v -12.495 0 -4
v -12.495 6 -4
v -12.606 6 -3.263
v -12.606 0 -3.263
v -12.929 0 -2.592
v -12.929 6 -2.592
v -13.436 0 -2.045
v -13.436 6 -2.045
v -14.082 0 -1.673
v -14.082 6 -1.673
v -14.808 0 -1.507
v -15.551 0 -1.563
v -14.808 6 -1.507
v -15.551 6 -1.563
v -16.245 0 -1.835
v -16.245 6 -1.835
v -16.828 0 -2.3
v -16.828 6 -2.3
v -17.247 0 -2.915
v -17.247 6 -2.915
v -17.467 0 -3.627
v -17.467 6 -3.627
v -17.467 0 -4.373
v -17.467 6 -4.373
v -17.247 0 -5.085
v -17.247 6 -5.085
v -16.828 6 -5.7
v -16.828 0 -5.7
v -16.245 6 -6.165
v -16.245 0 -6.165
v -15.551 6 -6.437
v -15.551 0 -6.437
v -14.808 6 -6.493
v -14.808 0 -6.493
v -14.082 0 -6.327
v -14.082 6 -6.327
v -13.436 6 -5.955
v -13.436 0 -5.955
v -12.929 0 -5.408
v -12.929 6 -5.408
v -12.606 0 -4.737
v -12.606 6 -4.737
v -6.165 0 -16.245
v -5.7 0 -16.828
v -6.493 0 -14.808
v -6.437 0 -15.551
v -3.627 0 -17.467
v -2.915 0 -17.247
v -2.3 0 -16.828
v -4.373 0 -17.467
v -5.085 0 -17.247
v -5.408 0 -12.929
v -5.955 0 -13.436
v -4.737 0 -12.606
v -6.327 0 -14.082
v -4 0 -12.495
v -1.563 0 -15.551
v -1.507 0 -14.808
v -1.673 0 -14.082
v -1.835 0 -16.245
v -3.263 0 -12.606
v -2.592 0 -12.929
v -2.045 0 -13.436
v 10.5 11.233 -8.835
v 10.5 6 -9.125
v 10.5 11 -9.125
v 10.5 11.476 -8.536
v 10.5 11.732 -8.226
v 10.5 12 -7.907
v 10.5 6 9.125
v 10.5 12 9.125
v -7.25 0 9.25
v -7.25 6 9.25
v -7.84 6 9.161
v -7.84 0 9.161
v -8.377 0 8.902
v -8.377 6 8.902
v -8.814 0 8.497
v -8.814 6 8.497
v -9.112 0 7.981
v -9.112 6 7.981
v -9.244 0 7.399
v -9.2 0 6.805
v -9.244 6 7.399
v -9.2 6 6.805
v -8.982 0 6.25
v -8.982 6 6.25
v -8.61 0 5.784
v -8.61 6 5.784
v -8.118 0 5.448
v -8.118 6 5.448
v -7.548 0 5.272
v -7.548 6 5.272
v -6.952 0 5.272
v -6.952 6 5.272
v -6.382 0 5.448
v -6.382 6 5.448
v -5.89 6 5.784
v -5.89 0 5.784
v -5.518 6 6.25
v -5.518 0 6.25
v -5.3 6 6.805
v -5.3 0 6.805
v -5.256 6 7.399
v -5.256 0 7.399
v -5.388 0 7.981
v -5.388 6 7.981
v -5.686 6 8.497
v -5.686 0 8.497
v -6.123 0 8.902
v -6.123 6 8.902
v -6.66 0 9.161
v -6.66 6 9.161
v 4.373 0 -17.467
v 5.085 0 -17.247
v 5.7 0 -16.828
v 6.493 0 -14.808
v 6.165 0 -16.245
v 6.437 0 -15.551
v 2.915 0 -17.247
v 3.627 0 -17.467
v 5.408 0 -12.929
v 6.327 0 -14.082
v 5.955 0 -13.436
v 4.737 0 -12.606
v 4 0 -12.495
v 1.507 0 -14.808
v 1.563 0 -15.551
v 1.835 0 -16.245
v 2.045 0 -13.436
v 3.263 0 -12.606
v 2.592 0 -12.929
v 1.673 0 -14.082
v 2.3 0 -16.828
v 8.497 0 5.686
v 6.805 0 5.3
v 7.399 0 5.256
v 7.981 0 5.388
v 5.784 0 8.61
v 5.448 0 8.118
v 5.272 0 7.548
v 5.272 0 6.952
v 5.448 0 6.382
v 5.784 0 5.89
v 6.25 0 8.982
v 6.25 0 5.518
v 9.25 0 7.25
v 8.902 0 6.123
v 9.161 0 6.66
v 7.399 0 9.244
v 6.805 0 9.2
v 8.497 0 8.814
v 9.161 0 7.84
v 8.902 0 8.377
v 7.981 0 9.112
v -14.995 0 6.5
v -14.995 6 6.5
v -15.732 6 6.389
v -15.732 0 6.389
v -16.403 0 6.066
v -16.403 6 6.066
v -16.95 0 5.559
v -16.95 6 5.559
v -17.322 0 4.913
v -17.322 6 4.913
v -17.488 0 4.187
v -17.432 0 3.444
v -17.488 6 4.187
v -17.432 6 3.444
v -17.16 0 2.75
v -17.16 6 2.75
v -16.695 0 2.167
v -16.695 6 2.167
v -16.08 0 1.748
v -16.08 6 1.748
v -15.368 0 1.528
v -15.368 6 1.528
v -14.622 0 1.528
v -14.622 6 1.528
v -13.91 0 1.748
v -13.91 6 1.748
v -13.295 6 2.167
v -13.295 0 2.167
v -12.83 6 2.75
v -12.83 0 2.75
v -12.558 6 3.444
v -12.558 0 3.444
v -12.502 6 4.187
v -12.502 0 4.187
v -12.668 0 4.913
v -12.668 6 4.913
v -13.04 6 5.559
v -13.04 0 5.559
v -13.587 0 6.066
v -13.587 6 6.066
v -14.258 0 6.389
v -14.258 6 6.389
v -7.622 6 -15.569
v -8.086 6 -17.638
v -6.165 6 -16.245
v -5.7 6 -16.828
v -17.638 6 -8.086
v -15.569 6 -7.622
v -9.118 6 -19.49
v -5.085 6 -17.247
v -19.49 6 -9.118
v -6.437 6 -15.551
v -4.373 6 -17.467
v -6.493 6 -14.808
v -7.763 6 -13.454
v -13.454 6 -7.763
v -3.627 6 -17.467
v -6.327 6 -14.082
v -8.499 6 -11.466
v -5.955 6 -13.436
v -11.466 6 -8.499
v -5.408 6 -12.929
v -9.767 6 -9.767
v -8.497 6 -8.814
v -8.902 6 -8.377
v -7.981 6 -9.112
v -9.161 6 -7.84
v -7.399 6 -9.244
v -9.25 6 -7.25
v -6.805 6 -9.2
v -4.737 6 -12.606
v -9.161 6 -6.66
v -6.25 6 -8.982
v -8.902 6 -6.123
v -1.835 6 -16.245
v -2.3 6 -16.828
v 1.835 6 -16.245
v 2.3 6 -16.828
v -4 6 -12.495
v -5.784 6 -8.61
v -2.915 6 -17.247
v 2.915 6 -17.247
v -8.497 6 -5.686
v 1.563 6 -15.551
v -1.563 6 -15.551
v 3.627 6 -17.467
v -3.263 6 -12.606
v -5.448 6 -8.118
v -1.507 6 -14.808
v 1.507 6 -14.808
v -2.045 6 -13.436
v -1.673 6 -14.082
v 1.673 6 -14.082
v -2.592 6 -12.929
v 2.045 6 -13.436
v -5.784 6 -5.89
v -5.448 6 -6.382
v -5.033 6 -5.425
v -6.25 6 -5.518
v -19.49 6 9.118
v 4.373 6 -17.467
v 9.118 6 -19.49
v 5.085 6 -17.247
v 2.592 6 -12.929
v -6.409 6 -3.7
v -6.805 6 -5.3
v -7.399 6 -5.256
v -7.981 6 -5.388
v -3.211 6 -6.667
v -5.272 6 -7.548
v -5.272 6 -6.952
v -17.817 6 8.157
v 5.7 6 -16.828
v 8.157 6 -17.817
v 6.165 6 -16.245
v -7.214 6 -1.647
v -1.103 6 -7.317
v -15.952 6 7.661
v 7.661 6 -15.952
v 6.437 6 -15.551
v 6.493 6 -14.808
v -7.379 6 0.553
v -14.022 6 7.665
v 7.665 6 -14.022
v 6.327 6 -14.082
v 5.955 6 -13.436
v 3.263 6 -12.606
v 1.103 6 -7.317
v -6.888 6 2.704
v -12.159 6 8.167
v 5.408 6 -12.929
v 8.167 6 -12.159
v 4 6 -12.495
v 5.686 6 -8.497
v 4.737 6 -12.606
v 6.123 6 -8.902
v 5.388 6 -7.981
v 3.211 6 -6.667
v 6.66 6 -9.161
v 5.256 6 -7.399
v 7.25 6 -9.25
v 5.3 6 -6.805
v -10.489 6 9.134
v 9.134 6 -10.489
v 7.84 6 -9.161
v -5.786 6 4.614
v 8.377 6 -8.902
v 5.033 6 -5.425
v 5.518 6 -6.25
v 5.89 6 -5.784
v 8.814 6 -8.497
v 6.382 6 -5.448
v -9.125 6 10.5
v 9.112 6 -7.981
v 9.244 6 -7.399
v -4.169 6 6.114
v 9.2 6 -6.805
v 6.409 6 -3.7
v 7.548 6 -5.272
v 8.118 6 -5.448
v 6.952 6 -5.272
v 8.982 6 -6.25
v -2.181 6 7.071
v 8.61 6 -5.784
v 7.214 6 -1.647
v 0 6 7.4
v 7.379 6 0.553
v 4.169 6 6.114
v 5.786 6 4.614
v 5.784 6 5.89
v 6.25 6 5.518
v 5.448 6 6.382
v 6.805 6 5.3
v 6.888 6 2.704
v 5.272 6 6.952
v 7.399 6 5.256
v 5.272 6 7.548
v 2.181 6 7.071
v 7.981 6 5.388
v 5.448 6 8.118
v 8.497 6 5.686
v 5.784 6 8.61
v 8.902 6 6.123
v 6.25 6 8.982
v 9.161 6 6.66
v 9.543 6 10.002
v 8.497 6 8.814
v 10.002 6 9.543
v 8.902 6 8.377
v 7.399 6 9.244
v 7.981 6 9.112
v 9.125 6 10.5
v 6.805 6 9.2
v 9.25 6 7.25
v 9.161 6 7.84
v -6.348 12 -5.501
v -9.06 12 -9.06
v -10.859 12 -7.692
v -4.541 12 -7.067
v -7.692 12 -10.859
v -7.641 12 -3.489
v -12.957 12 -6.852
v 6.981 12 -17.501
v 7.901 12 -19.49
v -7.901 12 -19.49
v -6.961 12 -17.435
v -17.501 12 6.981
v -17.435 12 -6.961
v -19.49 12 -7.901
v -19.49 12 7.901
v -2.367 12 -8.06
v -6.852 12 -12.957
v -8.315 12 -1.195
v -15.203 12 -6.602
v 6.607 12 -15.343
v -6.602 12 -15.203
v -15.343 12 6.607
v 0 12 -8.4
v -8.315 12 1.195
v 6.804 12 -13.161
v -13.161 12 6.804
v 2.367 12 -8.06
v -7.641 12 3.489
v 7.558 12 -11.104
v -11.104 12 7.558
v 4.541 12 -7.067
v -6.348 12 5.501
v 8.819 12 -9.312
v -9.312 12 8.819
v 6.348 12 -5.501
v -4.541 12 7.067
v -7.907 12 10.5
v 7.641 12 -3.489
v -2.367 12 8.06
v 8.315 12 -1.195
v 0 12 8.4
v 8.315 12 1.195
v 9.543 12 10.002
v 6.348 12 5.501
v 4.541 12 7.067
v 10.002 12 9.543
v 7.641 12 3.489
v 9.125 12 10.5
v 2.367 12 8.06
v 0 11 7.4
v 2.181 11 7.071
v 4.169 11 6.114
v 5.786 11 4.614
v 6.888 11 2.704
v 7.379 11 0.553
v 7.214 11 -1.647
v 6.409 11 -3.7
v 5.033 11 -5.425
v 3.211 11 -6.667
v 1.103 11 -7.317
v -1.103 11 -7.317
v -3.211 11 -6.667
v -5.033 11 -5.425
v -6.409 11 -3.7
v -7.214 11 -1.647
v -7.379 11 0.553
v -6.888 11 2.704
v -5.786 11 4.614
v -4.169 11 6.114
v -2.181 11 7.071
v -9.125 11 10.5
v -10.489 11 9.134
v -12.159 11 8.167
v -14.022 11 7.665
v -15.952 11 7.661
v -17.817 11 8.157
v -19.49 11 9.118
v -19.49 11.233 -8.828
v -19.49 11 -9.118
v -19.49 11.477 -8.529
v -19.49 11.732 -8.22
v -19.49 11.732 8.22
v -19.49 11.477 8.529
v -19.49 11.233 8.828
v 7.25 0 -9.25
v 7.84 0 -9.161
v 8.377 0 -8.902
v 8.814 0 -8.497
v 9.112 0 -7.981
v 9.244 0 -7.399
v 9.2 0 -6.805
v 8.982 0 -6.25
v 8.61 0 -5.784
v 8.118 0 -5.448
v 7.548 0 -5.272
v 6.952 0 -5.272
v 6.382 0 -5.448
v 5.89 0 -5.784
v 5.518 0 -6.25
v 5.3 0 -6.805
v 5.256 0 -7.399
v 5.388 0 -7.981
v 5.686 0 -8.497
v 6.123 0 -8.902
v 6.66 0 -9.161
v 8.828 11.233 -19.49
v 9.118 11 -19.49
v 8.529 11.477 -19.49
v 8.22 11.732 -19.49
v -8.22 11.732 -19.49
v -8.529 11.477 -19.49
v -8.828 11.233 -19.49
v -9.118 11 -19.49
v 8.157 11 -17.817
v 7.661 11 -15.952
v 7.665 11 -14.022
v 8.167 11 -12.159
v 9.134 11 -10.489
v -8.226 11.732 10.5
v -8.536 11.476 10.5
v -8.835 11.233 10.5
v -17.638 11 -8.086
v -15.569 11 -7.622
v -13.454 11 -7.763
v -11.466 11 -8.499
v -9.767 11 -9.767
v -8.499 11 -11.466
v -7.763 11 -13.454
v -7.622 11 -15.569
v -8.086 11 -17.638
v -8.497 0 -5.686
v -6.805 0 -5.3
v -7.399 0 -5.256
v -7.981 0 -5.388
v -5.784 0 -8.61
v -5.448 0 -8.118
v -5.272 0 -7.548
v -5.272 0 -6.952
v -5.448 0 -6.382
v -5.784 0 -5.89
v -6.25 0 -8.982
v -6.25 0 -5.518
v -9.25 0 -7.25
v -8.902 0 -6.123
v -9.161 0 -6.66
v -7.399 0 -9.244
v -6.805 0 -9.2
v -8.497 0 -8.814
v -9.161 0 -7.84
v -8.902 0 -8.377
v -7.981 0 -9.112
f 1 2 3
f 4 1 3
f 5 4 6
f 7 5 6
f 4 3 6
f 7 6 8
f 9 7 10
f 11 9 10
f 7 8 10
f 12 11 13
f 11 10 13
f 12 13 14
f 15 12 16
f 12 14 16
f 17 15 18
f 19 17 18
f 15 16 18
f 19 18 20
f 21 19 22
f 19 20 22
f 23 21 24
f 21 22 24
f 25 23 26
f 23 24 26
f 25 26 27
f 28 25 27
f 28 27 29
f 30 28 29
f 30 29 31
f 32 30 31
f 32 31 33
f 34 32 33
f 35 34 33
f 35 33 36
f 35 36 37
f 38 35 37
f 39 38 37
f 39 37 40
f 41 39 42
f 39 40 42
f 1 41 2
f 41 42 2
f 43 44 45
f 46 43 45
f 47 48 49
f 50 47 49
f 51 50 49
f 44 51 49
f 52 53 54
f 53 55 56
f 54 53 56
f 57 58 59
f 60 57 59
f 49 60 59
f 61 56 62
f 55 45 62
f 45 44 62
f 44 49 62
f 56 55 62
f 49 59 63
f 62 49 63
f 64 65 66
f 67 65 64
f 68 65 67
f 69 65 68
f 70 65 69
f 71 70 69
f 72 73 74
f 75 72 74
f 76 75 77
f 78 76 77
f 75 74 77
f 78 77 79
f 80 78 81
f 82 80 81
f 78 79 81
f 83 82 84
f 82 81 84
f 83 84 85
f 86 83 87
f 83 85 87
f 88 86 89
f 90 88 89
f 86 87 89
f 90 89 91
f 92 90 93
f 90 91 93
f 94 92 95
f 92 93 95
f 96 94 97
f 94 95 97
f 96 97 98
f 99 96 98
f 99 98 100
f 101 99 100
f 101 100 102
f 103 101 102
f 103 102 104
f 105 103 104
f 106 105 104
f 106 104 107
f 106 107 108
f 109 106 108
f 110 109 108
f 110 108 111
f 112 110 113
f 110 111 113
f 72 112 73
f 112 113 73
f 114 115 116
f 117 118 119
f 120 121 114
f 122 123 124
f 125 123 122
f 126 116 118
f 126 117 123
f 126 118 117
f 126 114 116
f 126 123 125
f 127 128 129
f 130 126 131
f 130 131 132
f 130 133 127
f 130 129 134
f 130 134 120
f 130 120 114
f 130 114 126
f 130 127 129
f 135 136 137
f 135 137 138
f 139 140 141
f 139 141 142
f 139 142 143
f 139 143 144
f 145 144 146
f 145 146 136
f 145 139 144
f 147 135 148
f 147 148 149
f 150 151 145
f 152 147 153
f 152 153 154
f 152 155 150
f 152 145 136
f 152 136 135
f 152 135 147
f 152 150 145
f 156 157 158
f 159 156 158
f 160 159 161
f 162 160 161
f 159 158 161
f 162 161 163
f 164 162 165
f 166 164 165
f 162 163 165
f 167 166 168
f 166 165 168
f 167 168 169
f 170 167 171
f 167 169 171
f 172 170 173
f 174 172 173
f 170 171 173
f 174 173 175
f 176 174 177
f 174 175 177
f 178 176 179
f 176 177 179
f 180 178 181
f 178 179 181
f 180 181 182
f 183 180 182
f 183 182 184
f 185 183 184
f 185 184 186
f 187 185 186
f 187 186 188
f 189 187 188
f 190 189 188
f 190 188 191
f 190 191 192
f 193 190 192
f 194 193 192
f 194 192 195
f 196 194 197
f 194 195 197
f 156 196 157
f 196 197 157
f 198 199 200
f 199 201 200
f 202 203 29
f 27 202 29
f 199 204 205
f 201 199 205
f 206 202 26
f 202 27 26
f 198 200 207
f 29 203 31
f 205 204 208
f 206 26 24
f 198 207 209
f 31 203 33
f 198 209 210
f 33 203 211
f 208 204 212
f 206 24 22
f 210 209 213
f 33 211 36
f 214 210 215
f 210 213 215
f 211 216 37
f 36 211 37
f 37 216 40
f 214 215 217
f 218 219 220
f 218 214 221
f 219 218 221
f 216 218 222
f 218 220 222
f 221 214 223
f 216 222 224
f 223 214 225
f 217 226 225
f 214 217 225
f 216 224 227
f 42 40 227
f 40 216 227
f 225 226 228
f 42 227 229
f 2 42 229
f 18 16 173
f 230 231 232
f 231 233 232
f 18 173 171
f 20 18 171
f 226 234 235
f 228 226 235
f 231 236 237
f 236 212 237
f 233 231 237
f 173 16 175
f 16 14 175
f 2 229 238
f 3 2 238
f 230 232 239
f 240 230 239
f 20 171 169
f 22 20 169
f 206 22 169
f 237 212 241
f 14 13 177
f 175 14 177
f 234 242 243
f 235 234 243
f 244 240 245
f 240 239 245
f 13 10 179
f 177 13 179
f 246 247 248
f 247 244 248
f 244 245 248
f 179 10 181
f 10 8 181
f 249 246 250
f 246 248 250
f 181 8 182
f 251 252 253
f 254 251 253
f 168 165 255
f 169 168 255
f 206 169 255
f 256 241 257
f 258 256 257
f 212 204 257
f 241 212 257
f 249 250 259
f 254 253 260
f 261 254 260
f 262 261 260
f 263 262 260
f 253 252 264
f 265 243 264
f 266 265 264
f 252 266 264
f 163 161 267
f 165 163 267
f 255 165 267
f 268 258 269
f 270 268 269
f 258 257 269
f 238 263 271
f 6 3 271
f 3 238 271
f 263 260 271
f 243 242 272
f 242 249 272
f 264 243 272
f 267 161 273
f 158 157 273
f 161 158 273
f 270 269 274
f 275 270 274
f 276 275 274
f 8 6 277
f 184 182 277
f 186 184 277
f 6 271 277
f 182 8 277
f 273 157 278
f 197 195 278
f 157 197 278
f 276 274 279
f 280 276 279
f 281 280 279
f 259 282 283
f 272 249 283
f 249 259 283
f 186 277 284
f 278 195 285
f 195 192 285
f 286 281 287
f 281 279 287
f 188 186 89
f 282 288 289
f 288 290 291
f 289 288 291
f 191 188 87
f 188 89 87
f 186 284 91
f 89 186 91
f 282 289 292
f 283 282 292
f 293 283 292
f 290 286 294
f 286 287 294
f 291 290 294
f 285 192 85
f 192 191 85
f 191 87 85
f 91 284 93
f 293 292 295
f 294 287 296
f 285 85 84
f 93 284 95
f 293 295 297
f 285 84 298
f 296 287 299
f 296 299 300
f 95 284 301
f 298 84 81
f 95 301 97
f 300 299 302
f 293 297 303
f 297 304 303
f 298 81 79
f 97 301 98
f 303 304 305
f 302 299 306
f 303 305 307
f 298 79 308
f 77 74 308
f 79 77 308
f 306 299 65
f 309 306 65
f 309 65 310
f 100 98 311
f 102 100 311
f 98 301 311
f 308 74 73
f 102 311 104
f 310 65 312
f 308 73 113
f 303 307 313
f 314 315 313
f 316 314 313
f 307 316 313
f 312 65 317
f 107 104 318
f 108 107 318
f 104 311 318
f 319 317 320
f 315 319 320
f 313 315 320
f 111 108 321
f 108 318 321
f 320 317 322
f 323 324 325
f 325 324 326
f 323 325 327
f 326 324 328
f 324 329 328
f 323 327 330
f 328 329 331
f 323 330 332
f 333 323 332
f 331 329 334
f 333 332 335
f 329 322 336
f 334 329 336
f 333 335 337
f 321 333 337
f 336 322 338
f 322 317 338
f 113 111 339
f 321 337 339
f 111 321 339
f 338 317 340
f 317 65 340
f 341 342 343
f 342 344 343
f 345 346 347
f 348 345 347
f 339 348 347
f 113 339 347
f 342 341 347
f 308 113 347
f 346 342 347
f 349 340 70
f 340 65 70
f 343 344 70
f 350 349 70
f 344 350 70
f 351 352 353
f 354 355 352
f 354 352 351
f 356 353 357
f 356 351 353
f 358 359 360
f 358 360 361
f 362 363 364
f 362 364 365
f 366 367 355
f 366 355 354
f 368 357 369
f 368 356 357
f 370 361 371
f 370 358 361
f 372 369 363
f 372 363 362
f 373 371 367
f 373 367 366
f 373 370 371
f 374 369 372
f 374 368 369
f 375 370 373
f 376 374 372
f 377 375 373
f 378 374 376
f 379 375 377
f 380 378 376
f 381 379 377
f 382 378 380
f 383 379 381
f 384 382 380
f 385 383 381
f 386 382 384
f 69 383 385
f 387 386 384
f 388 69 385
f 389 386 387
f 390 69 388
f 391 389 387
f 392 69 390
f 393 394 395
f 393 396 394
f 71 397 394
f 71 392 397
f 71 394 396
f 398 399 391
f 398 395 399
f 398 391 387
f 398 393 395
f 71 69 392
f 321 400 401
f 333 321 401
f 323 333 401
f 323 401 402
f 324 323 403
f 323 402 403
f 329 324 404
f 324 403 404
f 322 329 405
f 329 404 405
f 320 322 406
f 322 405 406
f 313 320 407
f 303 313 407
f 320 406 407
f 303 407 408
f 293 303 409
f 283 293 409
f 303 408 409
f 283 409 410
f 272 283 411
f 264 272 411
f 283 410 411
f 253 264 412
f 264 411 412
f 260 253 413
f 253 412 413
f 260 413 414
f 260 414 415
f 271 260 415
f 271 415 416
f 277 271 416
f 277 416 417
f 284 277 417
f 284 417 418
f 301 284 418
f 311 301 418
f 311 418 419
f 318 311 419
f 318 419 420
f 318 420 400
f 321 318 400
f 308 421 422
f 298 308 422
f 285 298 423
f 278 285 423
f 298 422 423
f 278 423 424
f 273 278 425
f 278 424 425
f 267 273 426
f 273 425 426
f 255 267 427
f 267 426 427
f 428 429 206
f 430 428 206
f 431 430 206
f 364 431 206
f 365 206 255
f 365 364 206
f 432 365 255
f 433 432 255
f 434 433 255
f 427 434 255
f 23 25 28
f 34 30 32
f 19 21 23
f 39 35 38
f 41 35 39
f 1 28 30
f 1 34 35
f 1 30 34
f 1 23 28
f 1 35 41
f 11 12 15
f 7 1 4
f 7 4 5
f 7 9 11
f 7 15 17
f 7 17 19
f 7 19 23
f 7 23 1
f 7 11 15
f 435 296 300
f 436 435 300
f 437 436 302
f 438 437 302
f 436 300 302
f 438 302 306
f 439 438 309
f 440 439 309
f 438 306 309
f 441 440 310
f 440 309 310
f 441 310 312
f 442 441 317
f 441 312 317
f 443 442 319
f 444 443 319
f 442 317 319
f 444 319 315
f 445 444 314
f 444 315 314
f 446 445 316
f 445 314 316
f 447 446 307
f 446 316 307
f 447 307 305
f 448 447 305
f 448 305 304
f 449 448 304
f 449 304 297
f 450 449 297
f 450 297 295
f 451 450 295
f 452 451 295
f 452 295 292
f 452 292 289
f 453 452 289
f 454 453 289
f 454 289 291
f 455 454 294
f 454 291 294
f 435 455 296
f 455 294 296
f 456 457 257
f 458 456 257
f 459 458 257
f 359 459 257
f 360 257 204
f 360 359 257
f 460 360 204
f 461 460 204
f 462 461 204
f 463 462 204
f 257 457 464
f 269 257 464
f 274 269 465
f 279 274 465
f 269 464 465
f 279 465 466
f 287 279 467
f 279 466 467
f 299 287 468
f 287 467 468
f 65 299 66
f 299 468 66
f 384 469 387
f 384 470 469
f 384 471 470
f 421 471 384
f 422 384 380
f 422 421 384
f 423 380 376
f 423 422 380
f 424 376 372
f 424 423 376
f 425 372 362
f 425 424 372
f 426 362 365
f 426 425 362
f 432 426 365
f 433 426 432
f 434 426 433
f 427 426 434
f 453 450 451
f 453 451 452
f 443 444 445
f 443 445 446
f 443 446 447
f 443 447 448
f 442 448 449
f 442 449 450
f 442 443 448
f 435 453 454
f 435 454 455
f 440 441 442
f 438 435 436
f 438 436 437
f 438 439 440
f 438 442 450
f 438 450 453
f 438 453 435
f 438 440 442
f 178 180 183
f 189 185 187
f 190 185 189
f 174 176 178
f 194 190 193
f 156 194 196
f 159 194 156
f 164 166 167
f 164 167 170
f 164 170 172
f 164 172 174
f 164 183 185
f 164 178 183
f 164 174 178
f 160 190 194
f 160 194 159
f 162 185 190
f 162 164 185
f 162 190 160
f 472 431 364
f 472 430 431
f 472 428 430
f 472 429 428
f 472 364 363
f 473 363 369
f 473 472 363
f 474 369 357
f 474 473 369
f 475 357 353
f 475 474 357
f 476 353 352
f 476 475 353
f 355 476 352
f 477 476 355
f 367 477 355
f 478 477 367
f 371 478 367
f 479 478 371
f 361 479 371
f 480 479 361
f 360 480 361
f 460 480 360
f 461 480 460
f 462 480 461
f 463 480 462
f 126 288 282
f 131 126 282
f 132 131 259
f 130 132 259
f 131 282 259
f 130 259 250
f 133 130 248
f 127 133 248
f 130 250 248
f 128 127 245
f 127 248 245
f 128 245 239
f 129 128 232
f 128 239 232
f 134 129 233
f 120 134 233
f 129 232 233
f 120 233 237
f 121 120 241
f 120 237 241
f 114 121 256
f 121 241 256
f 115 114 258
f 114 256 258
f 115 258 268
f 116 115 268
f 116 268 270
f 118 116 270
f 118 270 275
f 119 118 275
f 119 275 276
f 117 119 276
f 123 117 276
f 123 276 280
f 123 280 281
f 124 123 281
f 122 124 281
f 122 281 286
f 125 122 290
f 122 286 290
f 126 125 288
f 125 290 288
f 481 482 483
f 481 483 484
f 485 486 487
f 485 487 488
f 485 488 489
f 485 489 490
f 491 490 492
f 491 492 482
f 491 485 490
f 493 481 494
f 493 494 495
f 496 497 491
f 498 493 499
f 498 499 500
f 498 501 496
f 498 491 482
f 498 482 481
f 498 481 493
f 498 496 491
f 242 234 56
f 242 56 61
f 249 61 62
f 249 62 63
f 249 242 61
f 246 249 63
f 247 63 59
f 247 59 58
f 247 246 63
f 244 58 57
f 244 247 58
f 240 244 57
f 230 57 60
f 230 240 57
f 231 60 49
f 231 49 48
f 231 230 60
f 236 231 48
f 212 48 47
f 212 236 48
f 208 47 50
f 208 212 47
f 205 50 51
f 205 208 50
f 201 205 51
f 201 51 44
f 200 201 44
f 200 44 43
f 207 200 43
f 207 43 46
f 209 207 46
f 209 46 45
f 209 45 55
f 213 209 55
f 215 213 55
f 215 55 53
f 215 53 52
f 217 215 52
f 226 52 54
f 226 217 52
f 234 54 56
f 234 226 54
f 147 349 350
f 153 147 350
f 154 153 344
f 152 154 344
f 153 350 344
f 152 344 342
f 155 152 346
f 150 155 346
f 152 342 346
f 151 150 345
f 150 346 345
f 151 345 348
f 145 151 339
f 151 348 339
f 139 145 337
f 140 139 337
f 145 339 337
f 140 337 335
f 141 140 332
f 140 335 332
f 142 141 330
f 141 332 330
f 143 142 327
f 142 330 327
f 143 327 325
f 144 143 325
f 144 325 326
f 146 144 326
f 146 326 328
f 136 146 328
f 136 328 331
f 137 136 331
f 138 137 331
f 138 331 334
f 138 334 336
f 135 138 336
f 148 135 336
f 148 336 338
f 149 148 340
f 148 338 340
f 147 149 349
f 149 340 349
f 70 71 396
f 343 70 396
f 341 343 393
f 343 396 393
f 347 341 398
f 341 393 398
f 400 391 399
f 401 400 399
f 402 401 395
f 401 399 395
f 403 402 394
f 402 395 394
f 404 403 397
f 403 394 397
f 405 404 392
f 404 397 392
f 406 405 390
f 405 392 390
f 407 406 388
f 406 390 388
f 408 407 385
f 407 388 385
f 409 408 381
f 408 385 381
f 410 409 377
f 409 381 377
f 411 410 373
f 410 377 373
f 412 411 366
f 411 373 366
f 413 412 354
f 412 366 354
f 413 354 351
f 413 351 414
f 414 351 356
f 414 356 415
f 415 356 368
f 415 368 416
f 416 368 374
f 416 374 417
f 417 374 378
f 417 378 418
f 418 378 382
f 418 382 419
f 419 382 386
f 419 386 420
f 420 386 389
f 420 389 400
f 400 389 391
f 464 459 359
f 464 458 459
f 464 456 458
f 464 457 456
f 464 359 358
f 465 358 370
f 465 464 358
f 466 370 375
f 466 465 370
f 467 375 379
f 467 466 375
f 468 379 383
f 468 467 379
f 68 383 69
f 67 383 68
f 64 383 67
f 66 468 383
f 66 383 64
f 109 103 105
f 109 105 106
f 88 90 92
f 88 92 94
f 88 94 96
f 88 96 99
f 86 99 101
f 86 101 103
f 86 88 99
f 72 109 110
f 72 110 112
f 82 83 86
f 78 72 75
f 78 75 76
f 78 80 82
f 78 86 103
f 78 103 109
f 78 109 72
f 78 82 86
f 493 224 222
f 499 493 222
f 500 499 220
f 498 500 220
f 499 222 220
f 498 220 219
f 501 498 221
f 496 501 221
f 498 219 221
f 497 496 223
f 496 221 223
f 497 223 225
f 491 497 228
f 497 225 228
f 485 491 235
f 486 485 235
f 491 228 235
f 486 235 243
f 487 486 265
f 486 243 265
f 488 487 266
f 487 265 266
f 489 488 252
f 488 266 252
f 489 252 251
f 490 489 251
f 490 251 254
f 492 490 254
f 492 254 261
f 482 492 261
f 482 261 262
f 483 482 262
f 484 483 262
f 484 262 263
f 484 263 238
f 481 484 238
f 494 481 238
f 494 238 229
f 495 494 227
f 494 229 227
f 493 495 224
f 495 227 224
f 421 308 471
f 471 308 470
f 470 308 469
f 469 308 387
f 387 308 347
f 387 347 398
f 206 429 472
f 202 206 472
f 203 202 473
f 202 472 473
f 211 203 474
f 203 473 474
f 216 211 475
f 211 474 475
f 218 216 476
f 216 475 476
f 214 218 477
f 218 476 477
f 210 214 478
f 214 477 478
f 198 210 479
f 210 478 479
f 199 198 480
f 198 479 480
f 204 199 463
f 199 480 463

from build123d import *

# Parameters (mm, degrees)
SKETCH1_W                   = 21
SKETCH1_H                   = 21
BOSS_EXTRUDE1_DEPTH         = 12
CUT_EXTRUDE1_REACH          = 21.092
SKETCH2_R                   = 7.4
SKETCH3_W                   = 21
SKETCH3_H                   = 6
BOSS_EXTRUDE2_DEPTH         = 8.99
SKETCH4_W                   = 21
SKETCH4_H                   = 6
BOSS_EXTRUDE3_DEPTH         = 8.99
SKETCH5_R                   = 2.5
BOSS_EXTRUDE4_DEPTH         = 6
CUT_EXTRUDE2_REACH          = 24.937
SKETCH6_R                   = 2.6
CIRPATTERN1_COUNT           = 2
CIRPATTERN1_ANGLE           = 90
CIRPATTERN1_COPY_1_SKETCH_R = 2.5
CIRPATTERN1_COPY_1_DEPTH    = 6
CIRPATTERN1_COPY_2_REACH    = 24.937
CIRPATTERN1_COPY_2_SKETCH_R = 2.6
SKETCH7_W                   = 31.659066887
SKETCH7_H                   = 31.46982372
CUT_EXTRUDE3_DEPTH          = 11
FILLET1_R                   = 7
SKETCH9_R                   = 7.4
CUT_EXTRUDE4_DEPTH          = 11
CIRPATTERN2_COUNT           = 4
SKETCH10_R                  = 2
BOSS_EXTRUDE5_DEPTH         = 6
CIRPATTERN3_COUNT           = 4
CHAMFER1_SIZE               = 1
CHAMFER2_SIZE               = 1


with BuildPart() as part:
    # Sketch1 → Boss-Extrude1 (new body)
    with BuildSketch(Plane(origin=(0, 0, 0), x_dir=(1, 0, 0), z_dir=(0, 1, 0))):
        Rectangle(SKETCH1_W, SKETCH1_H)
    extrude(amount=BOSS_EXTRUDE1_DEPTH)

    # Sketch2 → Cut-Extrude1 (cut, up to next)
    with BuildSketch(Plane(origin=(0, 12, 0), x_dir=(1, 0, 0), z_dir=(0, 1, 0)), mode=Mode.PRIVATE) as cut_extrude1_sk1:
        with Locations(Location((0, 0, 0), (0, 0, 270))):
            Circle(SKETCH2_R)
    cut_extrude1_tool1 = extrude(cut_extrude1_sk1.sketch, amount=-CUT_EXTRUDE1_REACH, mode=Mode.PRIVATE) & part.part
    add(cut_extrude1_tool1.solids().sort_by_distance((0, 12, 0))[0], mode=Mode.SUBTRACT)

    # Sketch3 → Boss-Extrude2 (add)
    with BuildSketch(Plane.XY.offset(10.5)):
        with Locations((0, 3)):
            Rectangle(SKETCH3_W, SKETCH3_H)
    boss_extrude2 = extrude(amount=BOSS_EXTRUDE2_DEPTH)

    # Sketch4 → Boss-Extrude3 (add)
    with BuildSketch(Plane(origin=(0, 0, -10.5), x_dir=(-1, 0, 0), z_dir=(0, 0, -1))):
        with Locations((0, 9)):
            Rectangle(SKETCH4_W, SKETCH4_H)
    boss_extrude3 = extrude(amount=BOSS_EXTRUDE3_DEPTH)

    # Sketch5 → Boss-Extrude4 (add)
    with BuildSketch(Plane.XZ.offset(-6)):
        with Locations(Location((4, -14.995, 0), (0, 0, 90))):
            Circle(SKETCH5_R)
    boss_extrude4 = extrude(amount=BOSS_EXTRUDE4_DEPTH)

    # Sketch6 → Cut-Extrude2 (cut, up to next)
    with BuildSketch(Plane(origin=(0, 6, 0), x_dir=(1, 0, 0), z_dir=(0, 1, 0)), mode=Mode.PRIVATE) as cut_extrude2_sk1:
        with Locations(Location((4.5, -14.995, 0), (0, 0, 270))):
            Circle(SKETCH6_R)
    cut_extrude2_tool1 = extrude(cut_extrude2_sk1.sketch, amount=-CUT_EXTRUDE2_REACH, mode=Mode.PRIVATE) & part.part
    cut_extrude2 = cut_extrude2_tool1.solids().sort_by_distance((4.5, 6, 14.995))[0]
    add(cut_extrude2, mode=Mode.SUBTRACT)

    # Mirror1: Boss-Extrude4 across plane
    add(boss_extrude4.mirror(Plane(origin=(0, 0, 0), x_dir=(0, 0, 1), z_dir=(1, 0, 0))))

    # Mirror2: Cut-Extrude2 across plane
    add(cut_extrude2.mirror(Plane(origin=(0, 0, 0), x_dir=(0, 0, 1), z_dir=(1, 0, 0))), mode=Mode.SUBTRACT)

    # CirPattern1: Boss-Extrude2, Boss-Extrude3, Boss-Extrude4, Cut-Extrude2 ×2 about axis
    cirpattern1_axis = Axis((0, 0, 0), (0, 1, 0))
    add([boss_extrude2.rotate(cirpattern1_axis, i * CIRPATTERN1_ANGLE / (CIRPATTERN1_COUNT - 1)) for i in range(1, CIRPATTERN1_COUNT)])
    add([boss_extrude3.rotate(cirpattern1_axis, i * CIRPATTERN1_ANGLE / (CIRPATTERN1_COUNT - 1)) for i in range(1, CIRPATTERN1_COUNT)])
    add([boss_extrude4.rotate(cirpattern1_axis, i * CIRPATTERN1_ANGLE / (CIRPATTERN1_COUNT - 1)) for i in range(1, CIRPATTERN1_COUNT)])
    add([cut_extrude2.rotate(cirpattern1_axis, i * CIRPATTERN1_ANGLE / (CIRPATTERN1_COUNT - 1)) for i in range(1, CIRPATTERN1_COUNT)], mode=Mode.SUBTRACT)

    # CirPattern1 copy 1 sketch → CirPattern1 copy 1 (add)
    with BuildSketch(Plane(origin=(0, 6, 0), x_dir=(0, 0, 1), z_dir=(0, -1, 0))):
        with Locations((4, 14.995)):
            Circle(CIRPATTERN1_COPY_1_SKETCH_R)
    extrude(amount=CIRPATTERN1_COPY_1_DEPTH)

    # CirPattern1 copy 2 sketch → CirPattern1 copy 2 (cut, up to next)
    with BuildSketch(Plane.ZX.offset(6), mode=Mode.PRIVATE) as cirpattern1_copy_2_sk1:
        with Locations((4.5, 14.995)):
            Circle(CIRPATTERN1_COPY_2_SKETCH_R)
    cirpattern1_copy_2_tool1 = extrude(cirpattern1_copy_2_sk1.sketch, amount=-CIRPATTERN1_COPY_2_REACH, mode=Mode.PRIVATE) & part.part
    add(cirpattern1_copy_2_tool1.solids().sort_by_distance((14.995, 6, 4.5))[0], mode=Mode.SUBTRACT)

    # Sketch7 → Cut-Extrude3 (cut)
    with BuildSketch(Plane.XZ.offset(-6)):
        with Locations((5.329533444, 5.23491186)):
            Rectangle(SKETCH7_W, SKETCH7_H)
    extrude(amount=CUT_EXTRUDE3_DEPTH, mode=Mode.SUBTRACT)

    # Fillet1
    fillet1_edges = [part.edges().sort_by_distance(p)[0] for p in [
        (-10.5, 9, -10.5),
    ]]
    fillet(fillet1_edges, radius=FILLET1_R)

    # Sketch9 → Cut-Extrude4 (cut)
    with BuildSketch(Plane(origin=(0, 12, 0), x_dir=(1, 0, 0), z_dir=(0, 1, 0))):
        with Locations((-15, 15)):
            Circle(SKETCH9_R)
    cut_extrude4 = extrude(amount=-CUT_EXTRUDE4_DEPTH, mode=Mode.SUBTRACT)

    # CirPattern2: Cut-Extrude4 ×4 about axis
    cirpattern2_axis = Axis((0, 0, 0), (0, 1, 0))
    for i in range(1, CIRPATTERN2_COUNT):
        add(cut_extrude4.rotate(cirpattern2_axis, i * 360 / CIRPATTERN2_COUNT), mode=Mode.SUBTRACT)

    # Sketch10 → Boss-Extrude5 (add)
    with BuildSketch(Plane.XZ.offset(-6)):
        with Locations(Location((-7.25, 7.25, 0), (0, 0, 90))):
            Circle(SKETCH10_R)
    boss_extrude5 = extrude(amount=BOSS_EXTRUDE5_DEPTH)

    # CirPattern3: Boss-Extrude5 ×4 about axis
    cirpattern3_axis = Axis((0, 0, 0), (0, 1, 0))
    for i in range(1, CIRPATTERN3_COUNT):
        add(boss_extrude5.rotate(cirpattern3_axis, i * 360 / CIRPATTERN3_COUNT))

    # Chamfer1
    chamfer1_edges = [part.edges().sort_by_distance(p)[0] for p in [
        (0, 12, -7.4),
    ]]
    chamfer(chamfer1_edges, length=CHAMFER1_SIZE)

    # Chamfer2
    chamfer2_edges = [part.edges().sort_by_distance(p)[0] for p in [
        (-9.767409819, 12, -9.767409819),
        (7.664935028, 12, -14.02182729),
        (-14.02182729, 12, 7.664935028),
    ]]
    chamfer(chamfer2_edges, length=CHAMFER2_SIZE)


solid = part.part
